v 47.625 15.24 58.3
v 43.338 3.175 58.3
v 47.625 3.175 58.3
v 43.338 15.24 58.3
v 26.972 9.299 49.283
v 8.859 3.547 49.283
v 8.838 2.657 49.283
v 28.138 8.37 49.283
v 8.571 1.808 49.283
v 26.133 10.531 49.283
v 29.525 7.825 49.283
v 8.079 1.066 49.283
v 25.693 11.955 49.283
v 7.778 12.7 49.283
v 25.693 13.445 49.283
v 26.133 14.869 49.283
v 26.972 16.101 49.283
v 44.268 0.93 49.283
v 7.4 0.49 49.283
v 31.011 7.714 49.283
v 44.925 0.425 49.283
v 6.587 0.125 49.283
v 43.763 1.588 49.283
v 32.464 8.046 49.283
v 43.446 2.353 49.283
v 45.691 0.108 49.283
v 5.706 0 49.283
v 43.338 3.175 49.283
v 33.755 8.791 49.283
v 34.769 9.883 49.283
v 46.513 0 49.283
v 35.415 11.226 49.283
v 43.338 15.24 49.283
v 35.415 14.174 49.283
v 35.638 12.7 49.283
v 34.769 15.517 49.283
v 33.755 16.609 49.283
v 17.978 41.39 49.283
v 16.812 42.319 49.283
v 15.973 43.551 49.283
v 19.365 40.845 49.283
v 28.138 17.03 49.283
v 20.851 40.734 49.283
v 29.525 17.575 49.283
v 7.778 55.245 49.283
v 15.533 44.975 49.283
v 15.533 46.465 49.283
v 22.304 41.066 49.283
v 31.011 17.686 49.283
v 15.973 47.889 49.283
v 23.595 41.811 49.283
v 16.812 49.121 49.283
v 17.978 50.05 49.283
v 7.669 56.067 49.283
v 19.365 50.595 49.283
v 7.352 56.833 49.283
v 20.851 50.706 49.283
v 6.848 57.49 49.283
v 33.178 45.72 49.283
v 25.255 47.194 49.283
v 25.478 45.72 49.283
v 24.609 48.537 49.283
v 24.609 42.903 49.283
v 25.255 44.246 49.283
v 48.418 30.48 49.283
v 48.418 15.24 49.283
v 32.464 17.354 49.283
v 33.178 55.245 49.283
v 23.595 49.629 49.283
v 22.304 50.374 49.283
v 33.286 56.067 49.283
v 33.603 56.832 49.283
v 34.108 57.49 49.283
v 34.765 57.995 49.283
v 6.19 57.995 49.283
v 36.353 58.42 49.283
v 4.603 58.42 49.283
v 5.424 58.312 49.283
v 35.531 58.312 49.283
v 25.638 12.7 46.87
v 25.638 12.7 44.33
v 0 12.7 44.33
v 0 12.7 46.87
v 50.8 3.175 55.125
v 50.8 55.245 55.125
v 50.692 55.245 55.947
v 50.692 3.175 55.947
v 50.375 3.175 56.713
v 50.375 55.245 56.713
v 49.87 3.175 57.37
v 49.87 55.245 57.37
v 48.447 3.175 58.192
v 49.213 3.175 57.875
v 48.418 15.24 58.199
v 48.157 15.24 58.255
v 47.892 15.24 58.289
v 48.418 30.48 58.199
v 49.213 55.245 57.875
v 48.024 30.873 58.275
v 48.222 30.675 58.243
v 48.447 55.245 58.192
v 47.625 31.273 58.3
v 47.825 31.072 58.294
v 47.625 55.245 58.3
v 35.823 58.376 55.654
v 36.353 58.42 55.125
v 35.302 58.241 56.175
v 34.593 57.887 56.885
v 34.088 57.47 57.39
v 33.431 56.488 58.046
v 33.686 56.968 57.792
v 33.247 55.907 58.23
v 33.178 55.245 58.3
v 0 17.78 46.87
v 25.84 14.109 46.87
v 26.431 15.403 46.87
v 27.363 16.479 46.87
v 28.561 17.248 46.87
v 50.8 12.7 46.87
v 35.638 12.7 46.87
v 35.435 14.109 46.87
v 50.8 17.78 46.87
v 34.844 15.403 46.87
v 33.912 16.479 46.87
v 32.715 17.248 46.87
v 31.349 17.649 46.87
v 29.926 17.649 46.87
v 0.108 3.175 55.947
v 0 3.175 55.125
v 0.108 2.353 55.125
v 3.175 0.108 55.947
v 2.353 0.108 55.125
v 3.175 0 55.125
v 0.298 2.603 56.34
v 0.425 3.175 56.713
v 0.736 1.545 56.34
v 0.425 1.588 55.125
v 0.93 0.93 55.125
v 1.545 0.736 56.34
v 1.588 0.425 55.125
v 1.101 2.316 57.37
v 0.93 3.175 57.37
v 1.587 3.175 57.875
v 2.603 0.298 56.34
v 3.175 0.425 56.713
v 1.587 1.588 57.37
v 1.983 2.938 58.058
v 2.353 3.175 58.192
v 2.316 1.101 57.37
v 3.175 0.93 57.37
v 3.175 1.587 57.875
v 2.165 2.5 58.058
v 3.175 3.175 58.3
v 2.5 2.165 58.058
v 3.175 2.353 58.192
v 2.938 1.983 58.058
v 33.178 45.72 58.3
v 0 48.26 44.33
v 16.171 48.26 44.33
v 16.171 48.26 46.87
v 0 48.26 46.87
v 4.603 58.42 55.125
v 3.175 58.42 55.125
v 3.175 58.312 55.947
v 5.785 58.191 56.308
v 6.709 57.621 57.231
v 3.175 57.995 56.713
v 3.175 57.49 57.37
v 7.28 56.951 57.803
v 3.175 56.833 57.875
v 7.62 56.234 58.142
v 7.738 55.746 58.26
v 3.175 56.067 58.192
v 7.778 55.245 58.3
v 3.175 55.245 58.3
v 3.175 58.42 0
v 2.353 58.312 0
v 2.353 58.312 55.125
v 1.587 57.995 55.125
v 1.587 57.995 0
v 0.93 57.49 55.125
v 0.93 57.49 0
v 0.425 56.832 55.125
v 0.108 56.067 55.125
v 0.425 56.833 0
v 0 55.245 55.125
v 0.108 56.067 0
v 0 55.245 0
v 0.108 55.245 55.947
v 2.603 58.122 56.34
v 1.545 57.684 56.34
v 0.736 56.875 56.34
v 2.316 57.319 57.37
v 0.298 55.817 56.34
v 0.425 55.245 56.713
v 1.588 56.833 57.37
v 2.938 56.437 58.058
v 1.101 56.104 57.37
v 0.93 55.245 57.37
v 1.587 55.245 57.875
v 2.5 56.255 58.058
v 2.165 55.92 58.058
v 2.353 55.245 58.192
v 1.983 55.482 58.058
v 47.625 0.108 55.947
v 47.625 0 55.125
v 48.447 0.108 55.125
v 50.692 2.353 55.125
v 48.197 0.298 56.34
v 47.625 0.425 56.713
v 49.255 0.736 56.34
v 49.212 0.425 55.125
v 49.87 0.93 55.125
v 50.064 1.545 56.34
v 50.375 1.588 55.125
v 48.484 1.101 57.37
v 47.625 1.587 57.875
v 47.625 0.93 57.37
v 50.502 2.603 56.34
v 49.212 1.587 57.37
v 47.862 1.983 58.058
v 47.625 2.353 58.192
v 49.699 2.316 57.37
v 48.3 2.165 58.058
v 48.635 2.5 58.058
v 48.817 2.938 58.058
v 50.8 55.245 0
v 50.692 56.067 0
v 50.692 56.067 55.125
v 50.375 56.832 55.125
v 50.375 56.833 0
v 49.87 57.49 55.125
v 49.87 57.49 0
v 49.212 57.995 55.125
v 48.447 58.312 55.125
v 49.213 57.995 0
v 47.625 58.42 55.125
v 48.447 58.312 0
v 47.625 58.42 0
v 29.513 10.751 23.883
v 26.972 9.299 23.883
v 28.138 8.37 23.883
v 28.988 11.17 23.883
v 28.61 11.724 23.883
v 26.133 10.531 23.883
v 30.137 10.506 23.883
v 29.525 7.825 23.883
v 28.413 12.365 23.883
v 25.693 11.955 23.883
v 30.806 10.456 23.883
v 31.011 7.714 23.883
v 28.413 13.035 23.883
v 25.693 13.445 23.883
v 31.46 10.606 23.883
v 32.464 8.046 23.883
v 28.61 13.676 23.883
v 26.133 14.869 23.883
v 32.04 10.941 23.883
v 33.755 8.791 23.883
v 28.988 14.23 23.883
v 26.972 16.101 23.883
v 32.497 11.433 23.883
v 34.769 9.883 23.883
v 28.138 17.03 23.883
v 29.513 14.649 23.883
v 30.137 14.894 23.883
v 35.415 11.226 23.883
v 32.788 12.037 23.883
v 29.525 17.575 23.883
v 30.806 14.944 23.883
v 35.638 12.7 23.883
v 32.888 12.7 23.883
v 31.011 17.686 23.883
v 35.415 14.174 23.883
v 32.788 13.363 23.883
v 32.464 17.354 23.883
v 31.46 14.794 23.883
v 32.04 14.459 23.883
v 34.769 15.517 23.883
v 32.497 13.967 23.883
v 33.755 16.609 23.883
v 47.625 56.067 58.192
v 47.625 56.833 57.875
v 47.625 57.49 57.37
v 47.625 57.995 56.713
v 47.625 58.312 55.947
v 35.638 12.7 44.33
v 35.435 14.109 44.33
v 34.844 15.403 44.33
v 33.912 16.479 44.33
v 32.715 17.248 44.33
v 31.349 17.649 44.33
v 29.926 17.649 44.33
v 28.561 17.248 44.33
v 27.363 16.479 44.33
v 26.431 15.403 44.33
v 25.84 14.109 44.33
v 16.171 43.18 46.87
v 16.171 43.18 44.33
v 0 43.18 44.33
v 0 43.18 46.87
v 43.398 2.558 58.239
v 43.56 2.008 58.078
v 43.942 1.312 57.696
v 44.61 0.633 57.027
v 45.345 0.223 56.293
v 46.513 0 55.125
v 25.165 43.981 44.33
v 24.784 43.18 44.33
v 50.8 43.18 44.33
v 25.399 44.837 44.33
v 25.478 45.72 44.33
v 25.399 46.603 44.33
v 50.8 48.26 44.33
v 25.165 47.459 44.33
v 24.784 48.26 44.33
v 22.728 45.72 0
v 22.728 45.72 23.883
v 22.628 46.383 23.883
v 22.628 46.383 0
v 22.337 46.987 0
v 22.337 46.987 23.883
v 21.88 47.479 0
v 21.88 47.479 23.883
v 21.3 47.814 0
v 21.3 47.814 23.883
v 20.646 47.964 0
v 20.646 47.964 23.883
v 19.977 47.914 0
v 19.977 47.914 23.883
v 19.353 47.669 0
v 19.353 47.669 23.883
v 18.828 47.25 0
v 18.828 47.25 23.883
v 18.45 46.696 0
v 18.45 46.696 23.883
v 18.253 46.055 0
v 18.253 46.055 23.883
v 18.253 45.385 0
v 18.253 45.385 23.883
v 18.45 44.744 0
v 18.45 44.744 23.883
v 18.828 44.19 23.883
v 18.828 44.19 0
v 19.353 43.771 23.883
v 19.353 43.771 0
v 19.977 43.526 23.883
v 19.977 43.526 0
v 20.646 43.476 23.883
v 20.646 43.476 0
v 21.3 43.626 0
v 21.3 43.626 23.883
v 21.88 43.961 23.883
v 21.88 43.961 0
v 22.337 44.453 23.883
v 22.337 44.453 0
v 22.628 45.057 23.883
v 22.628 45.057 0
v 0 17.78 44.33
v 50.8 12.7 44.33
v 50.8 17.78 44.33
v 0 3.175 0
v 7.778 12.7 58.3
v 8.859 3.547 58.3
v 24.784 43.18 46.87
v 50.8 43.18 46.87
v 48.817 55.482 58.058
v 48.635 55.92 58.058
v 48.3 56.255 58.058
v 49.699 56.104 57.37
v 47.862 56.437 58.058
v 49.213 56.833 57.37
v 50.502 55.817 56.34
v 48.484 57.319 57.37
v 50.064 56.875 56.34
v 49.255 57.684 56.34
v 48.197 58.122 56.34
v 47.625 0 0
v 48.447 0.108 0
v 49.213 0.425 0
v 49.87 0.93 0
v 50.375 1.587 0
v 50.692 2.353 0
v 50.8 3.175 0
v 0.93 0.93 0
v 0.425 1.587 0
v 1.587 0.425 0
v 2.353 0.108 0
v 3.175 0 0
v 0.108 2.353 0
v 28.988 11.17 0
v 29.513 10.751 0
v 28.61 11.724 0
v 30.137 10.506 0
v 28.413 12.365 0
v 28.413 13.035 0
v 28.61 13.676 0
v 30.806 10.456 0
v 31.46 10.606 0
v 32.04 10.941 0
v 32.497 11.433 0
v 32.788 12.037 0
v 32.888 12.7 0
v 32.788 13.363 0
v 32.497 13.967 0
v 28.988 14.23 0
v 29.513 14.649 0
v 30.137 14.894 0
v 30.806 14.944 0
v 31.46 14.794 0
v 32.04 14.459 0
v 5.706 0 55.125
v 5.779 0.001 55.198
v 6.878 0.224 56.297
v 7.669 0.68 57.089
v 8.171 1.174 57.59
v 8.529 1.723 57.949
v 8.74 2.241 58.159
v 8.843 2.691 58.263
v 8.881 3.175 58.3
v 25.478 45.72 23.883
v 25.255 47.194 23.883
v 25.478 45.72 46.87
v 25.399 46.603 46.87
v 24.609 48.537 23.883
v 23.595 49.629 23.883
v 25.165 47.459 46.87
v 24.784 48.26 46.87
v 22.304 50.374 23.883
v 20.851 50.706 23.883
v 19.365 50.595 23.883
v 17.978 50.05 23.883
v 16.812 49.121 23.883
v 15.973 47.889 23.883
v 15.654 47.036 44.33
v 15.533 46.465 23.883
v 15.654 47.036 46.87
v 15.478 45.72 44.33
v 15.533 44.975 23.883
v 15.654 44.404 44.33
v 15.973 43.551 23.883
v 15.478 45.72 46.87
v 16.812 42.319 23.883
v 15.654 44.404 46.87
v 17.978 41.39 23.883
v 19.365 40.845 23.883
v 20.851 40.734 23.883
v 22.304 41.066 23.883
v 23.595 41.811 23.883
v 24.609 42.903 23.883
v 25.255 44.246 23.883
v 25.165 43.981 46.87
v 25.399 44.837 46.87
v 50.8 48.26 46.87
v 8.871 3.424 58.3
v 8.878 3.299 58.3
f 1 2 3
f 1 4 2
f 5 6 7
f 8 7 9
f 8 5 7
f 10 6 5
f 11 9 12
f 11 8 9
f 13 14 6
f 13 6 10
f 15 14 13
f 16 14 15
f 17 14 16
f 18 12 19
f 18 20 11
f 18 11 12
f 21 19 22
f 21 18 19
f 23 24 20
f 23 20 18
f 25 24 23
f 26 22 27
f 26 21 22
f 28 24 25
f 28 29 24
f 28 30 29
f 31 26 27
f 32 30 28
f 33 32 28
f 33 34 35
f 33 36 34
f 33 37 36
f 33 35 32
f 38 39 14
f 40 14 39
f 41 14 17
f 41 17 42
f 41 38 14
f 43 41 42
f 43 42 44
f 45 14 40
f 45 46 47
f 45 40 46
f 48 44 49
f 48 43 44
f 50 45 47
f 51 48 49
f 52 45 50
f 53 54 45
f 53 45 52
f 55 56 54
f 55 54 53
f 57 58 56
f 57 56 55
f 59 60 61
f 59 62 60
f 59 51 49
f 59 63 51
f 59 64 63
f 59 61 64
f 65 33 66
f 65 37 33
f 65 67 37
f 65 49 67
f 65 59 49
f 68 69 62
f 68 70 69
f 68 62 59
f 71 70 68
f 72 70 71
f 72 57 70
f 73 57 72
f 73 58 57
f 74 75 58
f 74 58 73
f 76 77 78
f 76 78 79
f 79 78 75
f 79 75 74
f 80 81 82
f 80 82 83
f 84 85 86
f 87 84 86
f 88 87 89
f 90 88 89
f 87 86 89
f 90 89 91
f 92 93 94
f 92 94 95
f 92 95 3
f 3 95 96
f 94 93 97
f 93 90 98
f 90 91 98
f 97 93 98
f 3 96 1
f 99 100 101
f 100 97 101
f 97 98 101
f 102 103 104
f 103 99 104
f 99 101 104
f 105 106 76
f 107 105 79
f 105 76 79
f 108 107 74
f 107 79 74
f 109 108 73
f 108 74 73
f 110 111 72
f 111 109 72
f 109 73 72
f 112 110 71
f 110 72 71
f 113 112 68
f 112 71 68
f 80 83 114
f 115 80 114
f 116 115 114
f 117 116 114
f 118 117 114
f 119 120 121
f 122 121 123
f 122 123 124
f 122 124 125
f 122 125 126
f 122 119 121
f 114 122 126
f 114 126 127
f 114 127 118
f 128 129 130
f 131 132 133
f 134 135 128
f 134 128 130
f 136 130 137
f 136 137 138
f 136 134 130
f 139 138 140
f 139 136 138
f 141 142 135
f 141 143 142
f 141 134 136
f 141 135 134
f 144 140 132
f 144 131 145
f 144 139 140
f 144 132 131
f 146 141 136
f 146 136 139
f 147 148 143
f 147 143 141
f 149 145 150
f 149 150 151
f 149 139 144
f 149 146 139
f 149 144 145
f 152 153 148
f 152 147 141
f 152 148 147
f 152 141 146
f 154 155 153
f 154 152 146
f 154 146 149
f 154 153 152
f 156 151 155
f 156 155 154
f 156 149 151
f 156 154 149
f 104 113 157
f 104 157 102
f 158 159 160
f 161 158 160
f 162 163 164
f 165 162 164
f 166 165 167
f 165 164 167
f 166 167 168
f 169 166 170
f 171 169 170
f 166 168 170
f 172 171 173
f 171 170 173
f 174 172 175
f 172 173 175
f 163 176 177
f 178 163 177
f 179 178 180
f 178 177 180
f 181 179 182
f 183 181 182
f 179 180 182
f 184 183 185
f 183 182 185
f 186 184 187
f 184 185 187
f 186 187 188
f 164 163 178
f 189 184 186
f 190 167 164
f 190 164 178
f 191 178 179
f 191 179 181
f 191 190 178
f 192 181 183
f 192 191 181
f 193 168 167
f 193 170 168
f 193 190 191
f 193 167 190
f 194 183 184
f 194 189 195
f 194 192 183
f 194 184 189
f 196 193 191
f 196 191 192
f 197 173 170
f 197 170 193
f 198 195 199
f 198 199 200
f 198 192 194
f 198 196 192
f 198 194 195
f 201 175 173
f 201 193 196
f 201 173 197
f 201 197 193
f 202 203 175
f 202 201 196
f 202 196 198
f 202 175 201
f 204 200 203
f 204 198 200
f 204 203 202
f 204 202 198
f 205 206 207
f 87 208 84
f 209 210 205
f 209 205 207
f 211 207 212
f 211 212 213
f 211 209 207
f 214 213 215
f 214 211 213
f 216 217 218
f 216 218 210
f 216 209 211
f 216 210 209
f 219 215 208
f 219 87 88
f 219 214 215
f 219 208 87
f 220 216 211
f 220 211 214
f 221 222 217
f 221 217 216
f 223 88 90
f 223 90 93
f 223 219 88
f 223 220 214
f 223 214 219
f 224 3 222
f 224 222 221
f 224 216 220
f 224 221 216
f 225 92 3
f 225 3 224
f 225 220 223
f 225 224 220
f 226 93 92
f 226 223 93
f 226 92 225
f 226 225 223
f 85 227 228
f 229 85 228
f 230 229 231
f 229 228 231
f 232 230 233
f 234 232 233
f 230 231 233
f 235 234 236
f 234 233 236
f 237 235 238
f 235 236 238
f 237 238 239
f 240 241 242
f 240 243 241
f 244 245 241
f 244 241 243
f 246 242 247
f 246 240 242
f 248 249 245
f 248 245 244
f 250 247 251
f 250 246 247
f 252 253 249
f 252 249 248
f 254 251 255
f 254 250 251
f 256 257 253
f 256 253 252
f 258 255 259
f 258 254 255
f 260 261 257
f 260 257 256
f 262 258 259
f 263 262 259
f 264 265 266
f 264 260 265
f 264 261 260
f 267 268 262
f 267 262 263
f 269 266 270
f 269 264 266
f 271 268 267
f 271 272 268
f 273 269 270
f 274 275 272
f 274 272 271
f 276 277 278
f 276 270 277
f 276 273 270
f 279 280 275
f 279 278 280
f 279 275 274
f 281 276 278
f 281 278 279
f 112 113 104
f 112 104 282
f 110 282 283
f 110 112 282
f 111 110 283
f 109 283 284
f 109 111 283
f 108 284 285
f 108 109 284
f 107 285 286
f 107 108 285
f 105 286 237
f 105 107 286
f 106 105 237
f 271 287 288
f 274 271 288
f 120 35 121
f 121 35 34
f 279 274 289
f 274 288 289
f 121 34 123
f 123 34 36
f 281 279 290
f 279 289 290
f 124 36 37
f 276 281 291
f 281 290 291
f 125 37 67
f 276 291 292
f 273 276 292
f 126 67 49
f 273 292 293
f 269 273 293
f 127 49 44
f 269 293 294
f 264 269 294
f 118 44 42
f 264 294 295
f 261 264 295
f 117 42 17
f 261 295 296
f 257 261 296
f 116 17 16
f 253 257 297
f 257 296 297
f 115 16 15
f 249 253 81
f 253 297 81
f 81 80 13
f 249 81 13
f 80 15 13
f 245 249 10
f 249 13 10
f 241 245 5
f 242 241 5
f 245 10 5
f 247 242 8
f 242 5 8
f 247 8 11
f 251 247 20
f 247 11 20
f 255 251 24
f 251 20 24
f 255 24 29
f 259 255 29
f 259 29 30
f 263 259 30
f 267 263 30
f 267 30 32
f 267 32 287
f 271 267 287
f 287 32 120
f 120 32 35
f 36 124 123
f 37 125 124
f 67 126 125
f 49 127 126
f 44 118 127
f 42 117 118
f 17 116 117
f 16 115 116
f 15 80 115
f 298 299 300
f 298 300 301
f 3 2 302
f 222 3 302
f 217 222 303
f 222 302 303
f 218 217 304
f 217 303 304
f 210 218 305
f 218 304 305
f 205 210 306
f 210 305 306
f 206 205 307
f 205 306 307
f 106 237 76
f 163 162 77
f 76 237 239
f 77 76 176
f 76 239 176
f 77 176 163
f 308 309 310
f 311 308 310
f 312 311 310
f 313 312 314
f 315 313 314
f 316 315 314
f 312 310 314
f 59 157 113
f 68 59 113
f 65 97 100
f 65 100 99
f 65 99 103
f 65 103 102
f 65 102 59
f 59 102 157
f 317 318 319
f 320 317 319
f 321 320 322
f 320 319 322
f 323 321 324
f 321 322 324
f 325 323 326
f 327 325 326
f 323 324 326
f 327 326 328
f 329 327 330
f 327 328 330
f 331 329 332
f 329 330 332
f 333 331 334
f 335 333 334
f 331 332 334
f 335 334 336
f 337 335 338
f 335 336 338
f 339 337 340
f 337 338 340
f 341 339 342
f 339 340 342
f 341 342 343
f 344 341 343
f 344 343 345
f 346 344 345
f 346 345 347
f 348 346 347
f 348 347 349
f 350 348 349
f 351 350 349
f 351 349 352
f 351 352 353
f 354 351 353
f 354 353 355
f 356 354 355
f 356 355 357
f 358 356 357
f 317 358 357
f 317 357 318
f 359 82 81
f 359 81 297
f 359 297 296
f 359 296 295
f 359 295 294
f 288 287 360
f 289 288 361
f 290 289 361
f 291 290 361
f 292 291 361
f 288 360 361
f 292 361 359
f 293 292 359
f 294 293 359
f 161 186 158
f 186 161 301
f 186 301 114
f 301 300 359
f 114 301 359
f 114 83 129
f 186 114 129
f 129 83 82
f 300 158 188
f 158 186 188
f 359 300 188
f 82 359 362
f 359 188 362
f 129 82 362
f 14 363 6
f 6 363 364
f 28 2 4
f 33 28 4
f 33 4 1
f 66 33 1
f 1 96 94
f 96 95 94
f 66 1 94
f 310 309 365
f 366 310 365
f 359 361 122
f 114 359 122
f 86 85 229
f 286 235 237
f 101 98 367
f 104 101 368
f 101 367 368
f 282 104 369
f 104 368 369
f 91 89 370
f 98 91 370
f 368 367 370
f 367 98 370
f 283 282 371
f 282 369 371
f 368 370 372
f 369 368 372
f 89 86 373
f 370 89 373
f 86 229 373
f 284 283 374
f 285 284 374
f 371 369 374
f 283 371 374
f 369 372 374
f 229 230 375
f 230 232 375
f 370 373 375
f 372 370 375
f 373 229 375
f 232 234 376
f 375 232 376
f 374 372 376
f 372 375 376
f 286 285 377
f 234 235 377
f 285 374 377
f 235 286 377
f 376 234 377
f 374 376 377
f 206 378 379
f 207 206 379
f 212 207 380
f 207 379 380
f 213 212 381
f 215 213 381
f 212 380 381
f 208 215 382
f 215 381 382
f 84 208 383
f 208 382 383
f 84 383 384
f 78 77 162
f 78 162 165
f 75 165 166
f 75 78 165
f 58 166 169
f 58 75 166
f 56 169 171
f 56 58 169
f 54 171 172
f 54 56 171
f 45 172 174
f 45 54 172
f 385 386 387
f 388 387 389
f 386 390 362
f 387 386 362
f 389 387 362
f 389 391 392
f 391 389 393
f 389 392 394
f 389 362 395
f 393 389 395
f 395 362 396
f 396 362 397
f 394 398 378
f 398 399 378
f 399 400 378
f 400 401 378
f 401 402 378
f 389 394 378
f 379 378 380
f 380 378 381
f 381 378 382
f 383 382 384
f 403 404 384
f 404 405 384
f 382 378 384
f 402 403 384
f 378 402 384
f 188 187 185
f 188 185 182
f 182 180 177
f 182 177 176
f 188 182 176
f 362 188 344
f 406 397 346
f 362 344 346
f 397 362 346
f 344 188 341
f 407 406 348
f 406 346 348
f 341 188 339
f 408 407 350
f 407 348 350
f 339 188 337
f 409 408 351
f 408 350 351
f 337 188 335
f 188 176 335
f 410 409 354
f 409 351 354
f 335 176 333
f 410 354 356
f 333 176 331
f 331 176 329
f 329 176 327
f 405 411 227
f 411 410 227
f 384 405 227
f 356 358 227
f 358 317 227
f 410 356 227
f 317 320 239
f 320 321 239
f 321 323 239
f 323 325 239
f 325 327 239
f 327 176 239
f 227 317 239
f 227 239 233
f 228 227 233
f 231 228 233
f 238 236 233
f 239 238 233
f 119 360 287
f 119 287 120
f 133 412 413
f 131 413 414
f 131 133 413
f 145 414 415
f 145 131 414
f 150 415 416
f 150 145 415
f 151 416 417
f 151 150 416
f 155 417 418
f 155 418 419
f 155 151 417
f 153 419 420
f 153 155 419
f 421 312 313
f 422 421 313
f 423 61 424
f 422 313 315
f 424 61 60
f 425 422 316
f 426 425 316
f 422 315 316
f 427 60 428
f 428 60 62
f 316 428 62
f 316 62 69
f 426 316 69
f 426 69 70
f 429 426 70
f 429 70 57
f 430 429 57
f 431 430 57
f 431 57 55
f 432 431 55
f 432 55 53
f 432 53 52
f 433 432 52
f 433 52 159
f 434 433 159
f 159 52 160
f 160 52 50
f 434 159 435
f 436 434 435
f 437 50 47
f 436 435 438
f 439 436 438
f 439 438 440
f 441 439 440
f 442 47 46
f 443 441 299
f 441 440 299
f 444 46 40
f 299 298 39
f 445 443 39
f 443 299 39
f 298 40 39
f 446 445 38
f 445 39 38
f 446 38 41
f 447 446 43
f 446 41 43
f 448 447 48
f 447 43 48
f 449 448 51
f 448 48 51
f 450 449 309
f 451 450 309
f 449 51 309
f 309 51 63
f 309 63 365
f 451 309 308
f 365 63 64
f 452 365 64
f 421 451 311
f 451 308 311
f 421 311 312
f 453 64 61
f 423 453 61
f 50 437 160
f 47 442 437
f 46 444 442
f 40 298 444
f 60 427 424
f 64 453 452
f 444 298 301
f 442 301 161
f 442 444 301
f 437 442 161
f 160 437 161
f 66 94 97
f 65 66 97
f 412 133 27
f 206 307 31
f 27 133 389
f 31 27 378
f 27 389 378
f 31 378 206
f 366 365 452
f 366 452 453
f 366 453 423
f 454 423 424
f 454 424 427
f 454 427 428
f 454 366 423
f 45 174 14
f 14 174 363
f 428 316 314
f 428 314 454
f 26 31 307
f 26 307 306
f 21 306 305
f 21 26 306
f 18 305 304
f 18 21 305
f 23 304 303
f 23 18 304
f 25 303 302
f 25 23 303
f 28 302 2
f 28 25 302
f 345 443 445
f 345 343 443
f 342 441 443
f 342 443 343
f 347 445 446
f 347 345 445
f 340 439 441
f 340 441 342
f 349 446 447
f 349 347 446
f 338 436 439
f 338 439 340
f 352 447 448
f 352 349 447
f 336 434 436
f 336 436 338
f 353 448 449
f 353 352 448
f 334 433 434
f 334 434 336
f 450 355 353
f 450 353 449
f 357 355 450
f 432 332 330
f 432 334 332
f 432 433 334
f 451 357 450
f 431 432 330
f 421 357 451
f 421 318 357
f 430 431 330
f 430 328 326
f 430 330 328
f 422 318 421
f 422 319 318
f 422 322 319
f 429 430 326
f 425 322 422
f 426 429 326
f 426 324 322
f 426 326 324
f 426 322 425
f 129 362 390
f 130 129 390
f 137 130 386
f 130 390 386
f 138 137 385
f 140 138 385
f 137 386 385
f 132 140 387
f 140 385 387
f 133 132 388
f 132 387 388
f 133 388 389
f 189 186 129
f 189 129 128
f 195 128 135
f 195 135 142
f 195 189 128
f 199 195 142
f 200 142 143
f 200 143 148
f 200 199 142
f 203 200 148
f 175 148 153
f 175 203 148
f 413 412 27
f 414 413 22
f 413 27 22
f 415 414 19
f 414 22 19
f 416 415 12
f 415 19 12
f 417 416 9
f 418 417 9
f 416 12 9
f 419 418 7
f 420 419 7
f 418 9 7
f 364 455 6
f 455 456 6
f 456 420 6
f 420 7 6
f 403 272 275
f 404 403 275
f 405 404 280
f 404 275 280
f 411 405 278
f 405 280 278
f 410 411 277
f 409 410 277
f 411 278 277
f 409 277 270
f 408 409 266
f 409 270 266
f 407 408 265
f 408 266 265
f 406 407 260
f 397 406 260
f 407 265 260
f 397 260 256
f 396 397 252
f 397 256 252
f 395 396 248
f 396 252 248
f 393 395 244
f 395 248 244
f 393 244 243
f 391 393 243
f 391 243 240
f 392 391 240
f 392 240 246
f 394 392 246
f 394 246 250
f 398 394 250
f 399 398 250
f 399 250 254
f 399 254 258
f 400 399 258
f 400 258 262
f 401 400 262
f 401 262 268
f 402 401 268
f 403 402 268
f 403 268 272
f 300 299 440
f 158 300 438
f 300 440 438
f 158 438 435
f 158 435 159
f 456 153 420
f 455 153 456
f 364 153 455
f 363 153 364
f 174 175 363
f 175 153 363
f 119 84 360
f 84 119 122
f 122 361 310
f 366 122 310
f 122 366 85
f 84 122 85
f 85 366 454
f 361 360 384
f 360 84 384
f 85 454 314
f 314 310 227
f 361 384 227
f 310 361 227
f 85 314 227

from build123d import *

# Parameters (mm, degrees)
F1_DEPTH     = 58.3
F3_DEPTH     = 9.017
F4_W         = 5.08
F4_H         = 2.54
F5_DEPTH     = 50.801
F6_T1_DEPTH  = 17.9471724254
F6_T3_DEPTH  = 16.9545
F6_T5_DEPTH  = 52.07
F6_T7_DEPTH  = 22.3848784961
F6_T9_DEPTH  = 12.2248784961
F6_T11_DEPTH = 14.0401215039
F6_T13_DEPTH = 12.5401215039
F6_T16_ANGLE = 90
F6_T18_ANGLE = 90
F6_T20_ANGLE = 90
F6_T22_ANGLE = 90
F7_R         = 5
F8_DEPTH     = 25.4
F9_R         = 2.25
F10_DEPTH    = 49.284


# Not quite as in the source:
# - a fillet or chamfer that OpenCascade refuses, or shapes differently, is made with other operations: its cross-section is extruded or revolved along the edge and cut away or added


with BuildPart() as f1:
    # F0 (on Top) → F1 (new body)
    with BuildSketch(Plane.XY):
        with BuildLine():
            Line((47.625, 58.42), (3.175, 58.42))
            ThreePointArc((3.175, 58.42), (0.9299359697, 57.4900640303), (0, 55.245))
            Line((0, 55.245), (0, 3.175))
            ThreePointArc((0, 3.175), (0.9299359697, 0.9299359697), (3.175, 0))
            Line((3.175, 0), (47.625, 0))
            ThreePointArc((47.625, 0), (49.8700640303, 0.9299359697), (50.8, 3.175))
            Line((50.8, 3.175), (50.8, 55.245))
            ThreePointArc((50.8, 55.245), (49.8700640303, 57.4900640303), (47.625, 58.42))
        make_face()
    extrude(amount=F1_DEPTH)

    # F2 (on face) → F3 (cut)
    with BuildSketch(Plane.XY.offset(58.3)):
        Polygon((33.1776215039, 45.72), (33.1776215039, 58.42), (7.7776215039, 58.42), (7.7776215039, 12.7), (9.2776215039, 0), (43.3376215039, 0), (43.3376215039, 15.24), (48.4176215039, 15.24), (48.4176215039, 30.48), align=None)
    extrude(amount=-F3_DEPTH, mode=Mode.SUBTRACT)

    # F4 (on face) → F5 (cut, through all)
    with BuildSketch(Plane.YZ.offset(50.8)):
        with Locations((15.24, 45.6)):
            Rectangle(F4_W, F4_H)
        with Locations((45.72, 45.6)):
            Rectangle(F4_W, F4_H)
    extrude(amount=-F5_DEPTH, mode=Mode.SUBTRACT)

    # F6: fillet of radius 3.175 on 6 edges, made by hand

    # F6_s2 → F6_t1 (cut)
    with BuildSketch(Plane.XY.offset(49.283)):
        with BuildLine():
            ThreePointArc((5.7055525338, 0), (8.0786339971, 1.0657087996), (8.8586359029, 3.5474114216))
            Line((8.8586359029, 3.5474114216), (9.2776215039, 0))
            Line((9.2776215039, 0), (5.7055525338, 0))
        make_face()
    extrude(amount=F6_T1_DEPTH, mode=Mode.SUBTRACT)

    # F6_s4 → F6_t3 (cut)
    with BuildSketch(Plane.XY.offset(49.283)):
        with BuildLine():
            ThreePointArc((46.5126215039, 0), (44.2675574737, 0.9299359697), (43.3376215039, 3.175))
            Line((43.3376215039, 3.175), (43.3376215039, 0))
            Line((43.3376215039, 0), (46.5126215039, 0))
        make_face()
        with BuildLine():
            ThreePointArc((4.6026215039, 58.42), (6.8476855342, 57.4900640303), (7.7776215039, 55.245))
            Line((7.7776215039, 55.245), (7.7776215039, 58.42))
            Line((7.7776215039, 58.42), (4.6026215039, 58.42))
        make_face()
        with BuildLine():
            ThreePointArc((36.3526215039, 58.42), (34.1075574737, 57.4900640303), (33.1776215039, 55.245))
            Line((33.1776215039, 55.245), (33.1776215039, 58.42))
            Line((33.1776215039, 58.42), (36.3526215039, 58.42))
        make_face()
    extrude(amount=F6_T3_DEPTH, mode=Mode.SUBTRACT)

    # F6_s6 → F6_t5 (cut)
    with BuildSketch(Plane.XZ.offset(-55.245)):
        with BuildLine():
            ThreePointArc((0, 55.125), (0.9299359697, 57.3700640303), (3.175, 58.3))
            Line((3.175, 58.3), (0, 58.3))
            Line((0, 58.3), (0, 55.125))
        make_face()
        with BuildLine():
            ThreePointArc((50.8, 55.125), (49.8700640303, 57.3700640303), (47.625, 58.3))
            Line((47.625, 58.3), (50.8, 58.3))
            Line((50.8, 58.3), (50.8, 55.125))
        make_face()
    extrude(amount=F6_T5_DEPTH, mode=Mode.SUBTRACT)

    # F6_s8 → F6_t7 (cut)
    with BuildSketch(Plane.YZ.offset(25.2401215039)):
        with BuildLine():
            ThreePointArc((55.245, 58.3), (57.4900640303, 57.3700640303), (58.42, 55.125))
            Line((58.42, 55.125), (58.42, 58.3))
            Line((58.42, 58.3), (55.245, 58.3))
        make_face()
    extrude(amount=F6_T7_DEPTH, mode=Mode.SUBTRACT)

    # F6_s10 → F6_t9 (cut)
    with BuildSketch(Plane.YZ.offset(35.4001215039)):
        with BuildLine():
            ThreePointArc((3.175, 58.3), (0.9299359697, 57.3700640303), (0, 55.125))
            Line((0, 55.125), (0, 58.3))
            Line((0, 58.3), (3.175, 58.3))
        make_face()
    extrude(amount=F6_T9_DEPTH, mode=Mode.SUBTRACT)

    # F6_s12 → F6_t11 (cut)
    with BuildSketch(Plane.YZ.offset(3.175)):
        with BuildLine():
            ThreePointArc((0, 55.125), (0.9299359697, 57.3700640303), (3.175, 58.3))
            Line((3.175, 58.3), (0, 58.3))
            Line((0, 58.3), (0, 55.125))
        make_face()
    extrude(amount=F6_T11_DEPTH, mode=Mode.SUBTRACT)

    # F6_s14 → F6_t13 (cut)
    with BuildSketch(Plane.YZ.offset(3.175)):
        with BuildLine():
            ThreePointArc((58.42, 55.125), (57.4900640303, 57.3700640303), (55.245, 58.3))
            Line((55.245, 58.3), (58.42, 58.3))
            Line((58.42, 58.3), (58.42, 55.125))
        make_face()
    extrude(amount=F6_T13_DEPTH, mode=Mode.SUBTRACT)

    # F6_s15 → F6_t16 (revolve, cut)
    with BuildSketch(Plane.YZ.offset(47.625)):
        with BuildLine():
            ThreePointArc((0, 55.125), (0.9299359697, 57.3700640303), (3.175, 58.3))
            Line((3.175, 58.3), (0, 58.3))
            Line((0, 58.3), (0, 55.125))
        make_face()
    revolve(axis=Axis((47.625, 3.175, 58.3), (0, 0, 1)), revolution_arc=F6_T16_ANGLE, mode=Mode.SUBTRACT)

    # F6_s17 → F6_t18 (revolve, cut)
    with BuildSketch(Plane.XZ.offset(-55.245)):
        with BuildLine():
            ThreePointArc((47.625, 58.3), (49.8700640303, 57.3700640303), (50.8, 55.125))
            Line((50.8, 55.125), (50.8, 58.3))
            Line((50.8, 58.3), (47.625, 58.3))
        make_face()
    revolve(axis=Axis((47.625, 55.245, 58.3), (0, 0, 1)), revolution_arc=F6_T18_ANGLE, mode=Mode.SUBTRACT)

    # F6_s19 → F6_t20 (revolve, cut)
    with BuildSketch(Plane.YZ.offset(3.175)):
        with BuildLine():
            ThreePointArc((58.42, 55.125), (57.4900640303, 57.3700640303), (55.245, 58.3))
            Line((55.245, 58.3), (58.42, 58.3))
            Line((58.42, 58.3), (58.42, 55.125))
        make_face()
    revolve(axis=Axis((3.175, 55.245, 58.3), (0, 0, 1)), revolution_arc=F6_T20_ANGLE, mode=Mode.SUBTRACT)

    # F6_s21 → F6_t22 (revolve, cut)
    with BuildSketch(Plane.XZ.offset(-3.175)):
        with BuildLine():
            ThreePointArc((0, 55.125), (0.9299359697, 57.3700640303), (3.175, 58.3))
            Line((3.175, 58.3), (0, 58.3))
            Line((0, 58.3), (0, 55.125))
        make_face()
    revolve(axis=Axis((3.175, 3.175, 58.3), (0, 0, 1)), revolution_arc=F6_T22_ANGLE, mode=Mode.SUBTRACT)

    # F7 (on face) → F8 (cut)
    with BuildSketch(Plane.XY.offset(49.283)):
        with Locations((20.4776215039, 45.72)):
            Circle(F7_R)
        with Locations((30.6376215039, 12.7)):
            Circle(F7_R)
    extrude(amount=-F8_DEPTH, mode=Mode.SUBTRACT)

    # F9 (on face) → F10 (cut, through all)
    with BuildSketch(Plane.XY.offset(49.283)):
        with Locations((20.4776215039, 45.72)):
            Circle(F9_R)
        with Locations((30.6376215039, 12.7)):
            Circle(F9_R)
    extrude(amount=-F10_DEPTH, mode=Mode.SUBTRACT)


solid = f1.part
